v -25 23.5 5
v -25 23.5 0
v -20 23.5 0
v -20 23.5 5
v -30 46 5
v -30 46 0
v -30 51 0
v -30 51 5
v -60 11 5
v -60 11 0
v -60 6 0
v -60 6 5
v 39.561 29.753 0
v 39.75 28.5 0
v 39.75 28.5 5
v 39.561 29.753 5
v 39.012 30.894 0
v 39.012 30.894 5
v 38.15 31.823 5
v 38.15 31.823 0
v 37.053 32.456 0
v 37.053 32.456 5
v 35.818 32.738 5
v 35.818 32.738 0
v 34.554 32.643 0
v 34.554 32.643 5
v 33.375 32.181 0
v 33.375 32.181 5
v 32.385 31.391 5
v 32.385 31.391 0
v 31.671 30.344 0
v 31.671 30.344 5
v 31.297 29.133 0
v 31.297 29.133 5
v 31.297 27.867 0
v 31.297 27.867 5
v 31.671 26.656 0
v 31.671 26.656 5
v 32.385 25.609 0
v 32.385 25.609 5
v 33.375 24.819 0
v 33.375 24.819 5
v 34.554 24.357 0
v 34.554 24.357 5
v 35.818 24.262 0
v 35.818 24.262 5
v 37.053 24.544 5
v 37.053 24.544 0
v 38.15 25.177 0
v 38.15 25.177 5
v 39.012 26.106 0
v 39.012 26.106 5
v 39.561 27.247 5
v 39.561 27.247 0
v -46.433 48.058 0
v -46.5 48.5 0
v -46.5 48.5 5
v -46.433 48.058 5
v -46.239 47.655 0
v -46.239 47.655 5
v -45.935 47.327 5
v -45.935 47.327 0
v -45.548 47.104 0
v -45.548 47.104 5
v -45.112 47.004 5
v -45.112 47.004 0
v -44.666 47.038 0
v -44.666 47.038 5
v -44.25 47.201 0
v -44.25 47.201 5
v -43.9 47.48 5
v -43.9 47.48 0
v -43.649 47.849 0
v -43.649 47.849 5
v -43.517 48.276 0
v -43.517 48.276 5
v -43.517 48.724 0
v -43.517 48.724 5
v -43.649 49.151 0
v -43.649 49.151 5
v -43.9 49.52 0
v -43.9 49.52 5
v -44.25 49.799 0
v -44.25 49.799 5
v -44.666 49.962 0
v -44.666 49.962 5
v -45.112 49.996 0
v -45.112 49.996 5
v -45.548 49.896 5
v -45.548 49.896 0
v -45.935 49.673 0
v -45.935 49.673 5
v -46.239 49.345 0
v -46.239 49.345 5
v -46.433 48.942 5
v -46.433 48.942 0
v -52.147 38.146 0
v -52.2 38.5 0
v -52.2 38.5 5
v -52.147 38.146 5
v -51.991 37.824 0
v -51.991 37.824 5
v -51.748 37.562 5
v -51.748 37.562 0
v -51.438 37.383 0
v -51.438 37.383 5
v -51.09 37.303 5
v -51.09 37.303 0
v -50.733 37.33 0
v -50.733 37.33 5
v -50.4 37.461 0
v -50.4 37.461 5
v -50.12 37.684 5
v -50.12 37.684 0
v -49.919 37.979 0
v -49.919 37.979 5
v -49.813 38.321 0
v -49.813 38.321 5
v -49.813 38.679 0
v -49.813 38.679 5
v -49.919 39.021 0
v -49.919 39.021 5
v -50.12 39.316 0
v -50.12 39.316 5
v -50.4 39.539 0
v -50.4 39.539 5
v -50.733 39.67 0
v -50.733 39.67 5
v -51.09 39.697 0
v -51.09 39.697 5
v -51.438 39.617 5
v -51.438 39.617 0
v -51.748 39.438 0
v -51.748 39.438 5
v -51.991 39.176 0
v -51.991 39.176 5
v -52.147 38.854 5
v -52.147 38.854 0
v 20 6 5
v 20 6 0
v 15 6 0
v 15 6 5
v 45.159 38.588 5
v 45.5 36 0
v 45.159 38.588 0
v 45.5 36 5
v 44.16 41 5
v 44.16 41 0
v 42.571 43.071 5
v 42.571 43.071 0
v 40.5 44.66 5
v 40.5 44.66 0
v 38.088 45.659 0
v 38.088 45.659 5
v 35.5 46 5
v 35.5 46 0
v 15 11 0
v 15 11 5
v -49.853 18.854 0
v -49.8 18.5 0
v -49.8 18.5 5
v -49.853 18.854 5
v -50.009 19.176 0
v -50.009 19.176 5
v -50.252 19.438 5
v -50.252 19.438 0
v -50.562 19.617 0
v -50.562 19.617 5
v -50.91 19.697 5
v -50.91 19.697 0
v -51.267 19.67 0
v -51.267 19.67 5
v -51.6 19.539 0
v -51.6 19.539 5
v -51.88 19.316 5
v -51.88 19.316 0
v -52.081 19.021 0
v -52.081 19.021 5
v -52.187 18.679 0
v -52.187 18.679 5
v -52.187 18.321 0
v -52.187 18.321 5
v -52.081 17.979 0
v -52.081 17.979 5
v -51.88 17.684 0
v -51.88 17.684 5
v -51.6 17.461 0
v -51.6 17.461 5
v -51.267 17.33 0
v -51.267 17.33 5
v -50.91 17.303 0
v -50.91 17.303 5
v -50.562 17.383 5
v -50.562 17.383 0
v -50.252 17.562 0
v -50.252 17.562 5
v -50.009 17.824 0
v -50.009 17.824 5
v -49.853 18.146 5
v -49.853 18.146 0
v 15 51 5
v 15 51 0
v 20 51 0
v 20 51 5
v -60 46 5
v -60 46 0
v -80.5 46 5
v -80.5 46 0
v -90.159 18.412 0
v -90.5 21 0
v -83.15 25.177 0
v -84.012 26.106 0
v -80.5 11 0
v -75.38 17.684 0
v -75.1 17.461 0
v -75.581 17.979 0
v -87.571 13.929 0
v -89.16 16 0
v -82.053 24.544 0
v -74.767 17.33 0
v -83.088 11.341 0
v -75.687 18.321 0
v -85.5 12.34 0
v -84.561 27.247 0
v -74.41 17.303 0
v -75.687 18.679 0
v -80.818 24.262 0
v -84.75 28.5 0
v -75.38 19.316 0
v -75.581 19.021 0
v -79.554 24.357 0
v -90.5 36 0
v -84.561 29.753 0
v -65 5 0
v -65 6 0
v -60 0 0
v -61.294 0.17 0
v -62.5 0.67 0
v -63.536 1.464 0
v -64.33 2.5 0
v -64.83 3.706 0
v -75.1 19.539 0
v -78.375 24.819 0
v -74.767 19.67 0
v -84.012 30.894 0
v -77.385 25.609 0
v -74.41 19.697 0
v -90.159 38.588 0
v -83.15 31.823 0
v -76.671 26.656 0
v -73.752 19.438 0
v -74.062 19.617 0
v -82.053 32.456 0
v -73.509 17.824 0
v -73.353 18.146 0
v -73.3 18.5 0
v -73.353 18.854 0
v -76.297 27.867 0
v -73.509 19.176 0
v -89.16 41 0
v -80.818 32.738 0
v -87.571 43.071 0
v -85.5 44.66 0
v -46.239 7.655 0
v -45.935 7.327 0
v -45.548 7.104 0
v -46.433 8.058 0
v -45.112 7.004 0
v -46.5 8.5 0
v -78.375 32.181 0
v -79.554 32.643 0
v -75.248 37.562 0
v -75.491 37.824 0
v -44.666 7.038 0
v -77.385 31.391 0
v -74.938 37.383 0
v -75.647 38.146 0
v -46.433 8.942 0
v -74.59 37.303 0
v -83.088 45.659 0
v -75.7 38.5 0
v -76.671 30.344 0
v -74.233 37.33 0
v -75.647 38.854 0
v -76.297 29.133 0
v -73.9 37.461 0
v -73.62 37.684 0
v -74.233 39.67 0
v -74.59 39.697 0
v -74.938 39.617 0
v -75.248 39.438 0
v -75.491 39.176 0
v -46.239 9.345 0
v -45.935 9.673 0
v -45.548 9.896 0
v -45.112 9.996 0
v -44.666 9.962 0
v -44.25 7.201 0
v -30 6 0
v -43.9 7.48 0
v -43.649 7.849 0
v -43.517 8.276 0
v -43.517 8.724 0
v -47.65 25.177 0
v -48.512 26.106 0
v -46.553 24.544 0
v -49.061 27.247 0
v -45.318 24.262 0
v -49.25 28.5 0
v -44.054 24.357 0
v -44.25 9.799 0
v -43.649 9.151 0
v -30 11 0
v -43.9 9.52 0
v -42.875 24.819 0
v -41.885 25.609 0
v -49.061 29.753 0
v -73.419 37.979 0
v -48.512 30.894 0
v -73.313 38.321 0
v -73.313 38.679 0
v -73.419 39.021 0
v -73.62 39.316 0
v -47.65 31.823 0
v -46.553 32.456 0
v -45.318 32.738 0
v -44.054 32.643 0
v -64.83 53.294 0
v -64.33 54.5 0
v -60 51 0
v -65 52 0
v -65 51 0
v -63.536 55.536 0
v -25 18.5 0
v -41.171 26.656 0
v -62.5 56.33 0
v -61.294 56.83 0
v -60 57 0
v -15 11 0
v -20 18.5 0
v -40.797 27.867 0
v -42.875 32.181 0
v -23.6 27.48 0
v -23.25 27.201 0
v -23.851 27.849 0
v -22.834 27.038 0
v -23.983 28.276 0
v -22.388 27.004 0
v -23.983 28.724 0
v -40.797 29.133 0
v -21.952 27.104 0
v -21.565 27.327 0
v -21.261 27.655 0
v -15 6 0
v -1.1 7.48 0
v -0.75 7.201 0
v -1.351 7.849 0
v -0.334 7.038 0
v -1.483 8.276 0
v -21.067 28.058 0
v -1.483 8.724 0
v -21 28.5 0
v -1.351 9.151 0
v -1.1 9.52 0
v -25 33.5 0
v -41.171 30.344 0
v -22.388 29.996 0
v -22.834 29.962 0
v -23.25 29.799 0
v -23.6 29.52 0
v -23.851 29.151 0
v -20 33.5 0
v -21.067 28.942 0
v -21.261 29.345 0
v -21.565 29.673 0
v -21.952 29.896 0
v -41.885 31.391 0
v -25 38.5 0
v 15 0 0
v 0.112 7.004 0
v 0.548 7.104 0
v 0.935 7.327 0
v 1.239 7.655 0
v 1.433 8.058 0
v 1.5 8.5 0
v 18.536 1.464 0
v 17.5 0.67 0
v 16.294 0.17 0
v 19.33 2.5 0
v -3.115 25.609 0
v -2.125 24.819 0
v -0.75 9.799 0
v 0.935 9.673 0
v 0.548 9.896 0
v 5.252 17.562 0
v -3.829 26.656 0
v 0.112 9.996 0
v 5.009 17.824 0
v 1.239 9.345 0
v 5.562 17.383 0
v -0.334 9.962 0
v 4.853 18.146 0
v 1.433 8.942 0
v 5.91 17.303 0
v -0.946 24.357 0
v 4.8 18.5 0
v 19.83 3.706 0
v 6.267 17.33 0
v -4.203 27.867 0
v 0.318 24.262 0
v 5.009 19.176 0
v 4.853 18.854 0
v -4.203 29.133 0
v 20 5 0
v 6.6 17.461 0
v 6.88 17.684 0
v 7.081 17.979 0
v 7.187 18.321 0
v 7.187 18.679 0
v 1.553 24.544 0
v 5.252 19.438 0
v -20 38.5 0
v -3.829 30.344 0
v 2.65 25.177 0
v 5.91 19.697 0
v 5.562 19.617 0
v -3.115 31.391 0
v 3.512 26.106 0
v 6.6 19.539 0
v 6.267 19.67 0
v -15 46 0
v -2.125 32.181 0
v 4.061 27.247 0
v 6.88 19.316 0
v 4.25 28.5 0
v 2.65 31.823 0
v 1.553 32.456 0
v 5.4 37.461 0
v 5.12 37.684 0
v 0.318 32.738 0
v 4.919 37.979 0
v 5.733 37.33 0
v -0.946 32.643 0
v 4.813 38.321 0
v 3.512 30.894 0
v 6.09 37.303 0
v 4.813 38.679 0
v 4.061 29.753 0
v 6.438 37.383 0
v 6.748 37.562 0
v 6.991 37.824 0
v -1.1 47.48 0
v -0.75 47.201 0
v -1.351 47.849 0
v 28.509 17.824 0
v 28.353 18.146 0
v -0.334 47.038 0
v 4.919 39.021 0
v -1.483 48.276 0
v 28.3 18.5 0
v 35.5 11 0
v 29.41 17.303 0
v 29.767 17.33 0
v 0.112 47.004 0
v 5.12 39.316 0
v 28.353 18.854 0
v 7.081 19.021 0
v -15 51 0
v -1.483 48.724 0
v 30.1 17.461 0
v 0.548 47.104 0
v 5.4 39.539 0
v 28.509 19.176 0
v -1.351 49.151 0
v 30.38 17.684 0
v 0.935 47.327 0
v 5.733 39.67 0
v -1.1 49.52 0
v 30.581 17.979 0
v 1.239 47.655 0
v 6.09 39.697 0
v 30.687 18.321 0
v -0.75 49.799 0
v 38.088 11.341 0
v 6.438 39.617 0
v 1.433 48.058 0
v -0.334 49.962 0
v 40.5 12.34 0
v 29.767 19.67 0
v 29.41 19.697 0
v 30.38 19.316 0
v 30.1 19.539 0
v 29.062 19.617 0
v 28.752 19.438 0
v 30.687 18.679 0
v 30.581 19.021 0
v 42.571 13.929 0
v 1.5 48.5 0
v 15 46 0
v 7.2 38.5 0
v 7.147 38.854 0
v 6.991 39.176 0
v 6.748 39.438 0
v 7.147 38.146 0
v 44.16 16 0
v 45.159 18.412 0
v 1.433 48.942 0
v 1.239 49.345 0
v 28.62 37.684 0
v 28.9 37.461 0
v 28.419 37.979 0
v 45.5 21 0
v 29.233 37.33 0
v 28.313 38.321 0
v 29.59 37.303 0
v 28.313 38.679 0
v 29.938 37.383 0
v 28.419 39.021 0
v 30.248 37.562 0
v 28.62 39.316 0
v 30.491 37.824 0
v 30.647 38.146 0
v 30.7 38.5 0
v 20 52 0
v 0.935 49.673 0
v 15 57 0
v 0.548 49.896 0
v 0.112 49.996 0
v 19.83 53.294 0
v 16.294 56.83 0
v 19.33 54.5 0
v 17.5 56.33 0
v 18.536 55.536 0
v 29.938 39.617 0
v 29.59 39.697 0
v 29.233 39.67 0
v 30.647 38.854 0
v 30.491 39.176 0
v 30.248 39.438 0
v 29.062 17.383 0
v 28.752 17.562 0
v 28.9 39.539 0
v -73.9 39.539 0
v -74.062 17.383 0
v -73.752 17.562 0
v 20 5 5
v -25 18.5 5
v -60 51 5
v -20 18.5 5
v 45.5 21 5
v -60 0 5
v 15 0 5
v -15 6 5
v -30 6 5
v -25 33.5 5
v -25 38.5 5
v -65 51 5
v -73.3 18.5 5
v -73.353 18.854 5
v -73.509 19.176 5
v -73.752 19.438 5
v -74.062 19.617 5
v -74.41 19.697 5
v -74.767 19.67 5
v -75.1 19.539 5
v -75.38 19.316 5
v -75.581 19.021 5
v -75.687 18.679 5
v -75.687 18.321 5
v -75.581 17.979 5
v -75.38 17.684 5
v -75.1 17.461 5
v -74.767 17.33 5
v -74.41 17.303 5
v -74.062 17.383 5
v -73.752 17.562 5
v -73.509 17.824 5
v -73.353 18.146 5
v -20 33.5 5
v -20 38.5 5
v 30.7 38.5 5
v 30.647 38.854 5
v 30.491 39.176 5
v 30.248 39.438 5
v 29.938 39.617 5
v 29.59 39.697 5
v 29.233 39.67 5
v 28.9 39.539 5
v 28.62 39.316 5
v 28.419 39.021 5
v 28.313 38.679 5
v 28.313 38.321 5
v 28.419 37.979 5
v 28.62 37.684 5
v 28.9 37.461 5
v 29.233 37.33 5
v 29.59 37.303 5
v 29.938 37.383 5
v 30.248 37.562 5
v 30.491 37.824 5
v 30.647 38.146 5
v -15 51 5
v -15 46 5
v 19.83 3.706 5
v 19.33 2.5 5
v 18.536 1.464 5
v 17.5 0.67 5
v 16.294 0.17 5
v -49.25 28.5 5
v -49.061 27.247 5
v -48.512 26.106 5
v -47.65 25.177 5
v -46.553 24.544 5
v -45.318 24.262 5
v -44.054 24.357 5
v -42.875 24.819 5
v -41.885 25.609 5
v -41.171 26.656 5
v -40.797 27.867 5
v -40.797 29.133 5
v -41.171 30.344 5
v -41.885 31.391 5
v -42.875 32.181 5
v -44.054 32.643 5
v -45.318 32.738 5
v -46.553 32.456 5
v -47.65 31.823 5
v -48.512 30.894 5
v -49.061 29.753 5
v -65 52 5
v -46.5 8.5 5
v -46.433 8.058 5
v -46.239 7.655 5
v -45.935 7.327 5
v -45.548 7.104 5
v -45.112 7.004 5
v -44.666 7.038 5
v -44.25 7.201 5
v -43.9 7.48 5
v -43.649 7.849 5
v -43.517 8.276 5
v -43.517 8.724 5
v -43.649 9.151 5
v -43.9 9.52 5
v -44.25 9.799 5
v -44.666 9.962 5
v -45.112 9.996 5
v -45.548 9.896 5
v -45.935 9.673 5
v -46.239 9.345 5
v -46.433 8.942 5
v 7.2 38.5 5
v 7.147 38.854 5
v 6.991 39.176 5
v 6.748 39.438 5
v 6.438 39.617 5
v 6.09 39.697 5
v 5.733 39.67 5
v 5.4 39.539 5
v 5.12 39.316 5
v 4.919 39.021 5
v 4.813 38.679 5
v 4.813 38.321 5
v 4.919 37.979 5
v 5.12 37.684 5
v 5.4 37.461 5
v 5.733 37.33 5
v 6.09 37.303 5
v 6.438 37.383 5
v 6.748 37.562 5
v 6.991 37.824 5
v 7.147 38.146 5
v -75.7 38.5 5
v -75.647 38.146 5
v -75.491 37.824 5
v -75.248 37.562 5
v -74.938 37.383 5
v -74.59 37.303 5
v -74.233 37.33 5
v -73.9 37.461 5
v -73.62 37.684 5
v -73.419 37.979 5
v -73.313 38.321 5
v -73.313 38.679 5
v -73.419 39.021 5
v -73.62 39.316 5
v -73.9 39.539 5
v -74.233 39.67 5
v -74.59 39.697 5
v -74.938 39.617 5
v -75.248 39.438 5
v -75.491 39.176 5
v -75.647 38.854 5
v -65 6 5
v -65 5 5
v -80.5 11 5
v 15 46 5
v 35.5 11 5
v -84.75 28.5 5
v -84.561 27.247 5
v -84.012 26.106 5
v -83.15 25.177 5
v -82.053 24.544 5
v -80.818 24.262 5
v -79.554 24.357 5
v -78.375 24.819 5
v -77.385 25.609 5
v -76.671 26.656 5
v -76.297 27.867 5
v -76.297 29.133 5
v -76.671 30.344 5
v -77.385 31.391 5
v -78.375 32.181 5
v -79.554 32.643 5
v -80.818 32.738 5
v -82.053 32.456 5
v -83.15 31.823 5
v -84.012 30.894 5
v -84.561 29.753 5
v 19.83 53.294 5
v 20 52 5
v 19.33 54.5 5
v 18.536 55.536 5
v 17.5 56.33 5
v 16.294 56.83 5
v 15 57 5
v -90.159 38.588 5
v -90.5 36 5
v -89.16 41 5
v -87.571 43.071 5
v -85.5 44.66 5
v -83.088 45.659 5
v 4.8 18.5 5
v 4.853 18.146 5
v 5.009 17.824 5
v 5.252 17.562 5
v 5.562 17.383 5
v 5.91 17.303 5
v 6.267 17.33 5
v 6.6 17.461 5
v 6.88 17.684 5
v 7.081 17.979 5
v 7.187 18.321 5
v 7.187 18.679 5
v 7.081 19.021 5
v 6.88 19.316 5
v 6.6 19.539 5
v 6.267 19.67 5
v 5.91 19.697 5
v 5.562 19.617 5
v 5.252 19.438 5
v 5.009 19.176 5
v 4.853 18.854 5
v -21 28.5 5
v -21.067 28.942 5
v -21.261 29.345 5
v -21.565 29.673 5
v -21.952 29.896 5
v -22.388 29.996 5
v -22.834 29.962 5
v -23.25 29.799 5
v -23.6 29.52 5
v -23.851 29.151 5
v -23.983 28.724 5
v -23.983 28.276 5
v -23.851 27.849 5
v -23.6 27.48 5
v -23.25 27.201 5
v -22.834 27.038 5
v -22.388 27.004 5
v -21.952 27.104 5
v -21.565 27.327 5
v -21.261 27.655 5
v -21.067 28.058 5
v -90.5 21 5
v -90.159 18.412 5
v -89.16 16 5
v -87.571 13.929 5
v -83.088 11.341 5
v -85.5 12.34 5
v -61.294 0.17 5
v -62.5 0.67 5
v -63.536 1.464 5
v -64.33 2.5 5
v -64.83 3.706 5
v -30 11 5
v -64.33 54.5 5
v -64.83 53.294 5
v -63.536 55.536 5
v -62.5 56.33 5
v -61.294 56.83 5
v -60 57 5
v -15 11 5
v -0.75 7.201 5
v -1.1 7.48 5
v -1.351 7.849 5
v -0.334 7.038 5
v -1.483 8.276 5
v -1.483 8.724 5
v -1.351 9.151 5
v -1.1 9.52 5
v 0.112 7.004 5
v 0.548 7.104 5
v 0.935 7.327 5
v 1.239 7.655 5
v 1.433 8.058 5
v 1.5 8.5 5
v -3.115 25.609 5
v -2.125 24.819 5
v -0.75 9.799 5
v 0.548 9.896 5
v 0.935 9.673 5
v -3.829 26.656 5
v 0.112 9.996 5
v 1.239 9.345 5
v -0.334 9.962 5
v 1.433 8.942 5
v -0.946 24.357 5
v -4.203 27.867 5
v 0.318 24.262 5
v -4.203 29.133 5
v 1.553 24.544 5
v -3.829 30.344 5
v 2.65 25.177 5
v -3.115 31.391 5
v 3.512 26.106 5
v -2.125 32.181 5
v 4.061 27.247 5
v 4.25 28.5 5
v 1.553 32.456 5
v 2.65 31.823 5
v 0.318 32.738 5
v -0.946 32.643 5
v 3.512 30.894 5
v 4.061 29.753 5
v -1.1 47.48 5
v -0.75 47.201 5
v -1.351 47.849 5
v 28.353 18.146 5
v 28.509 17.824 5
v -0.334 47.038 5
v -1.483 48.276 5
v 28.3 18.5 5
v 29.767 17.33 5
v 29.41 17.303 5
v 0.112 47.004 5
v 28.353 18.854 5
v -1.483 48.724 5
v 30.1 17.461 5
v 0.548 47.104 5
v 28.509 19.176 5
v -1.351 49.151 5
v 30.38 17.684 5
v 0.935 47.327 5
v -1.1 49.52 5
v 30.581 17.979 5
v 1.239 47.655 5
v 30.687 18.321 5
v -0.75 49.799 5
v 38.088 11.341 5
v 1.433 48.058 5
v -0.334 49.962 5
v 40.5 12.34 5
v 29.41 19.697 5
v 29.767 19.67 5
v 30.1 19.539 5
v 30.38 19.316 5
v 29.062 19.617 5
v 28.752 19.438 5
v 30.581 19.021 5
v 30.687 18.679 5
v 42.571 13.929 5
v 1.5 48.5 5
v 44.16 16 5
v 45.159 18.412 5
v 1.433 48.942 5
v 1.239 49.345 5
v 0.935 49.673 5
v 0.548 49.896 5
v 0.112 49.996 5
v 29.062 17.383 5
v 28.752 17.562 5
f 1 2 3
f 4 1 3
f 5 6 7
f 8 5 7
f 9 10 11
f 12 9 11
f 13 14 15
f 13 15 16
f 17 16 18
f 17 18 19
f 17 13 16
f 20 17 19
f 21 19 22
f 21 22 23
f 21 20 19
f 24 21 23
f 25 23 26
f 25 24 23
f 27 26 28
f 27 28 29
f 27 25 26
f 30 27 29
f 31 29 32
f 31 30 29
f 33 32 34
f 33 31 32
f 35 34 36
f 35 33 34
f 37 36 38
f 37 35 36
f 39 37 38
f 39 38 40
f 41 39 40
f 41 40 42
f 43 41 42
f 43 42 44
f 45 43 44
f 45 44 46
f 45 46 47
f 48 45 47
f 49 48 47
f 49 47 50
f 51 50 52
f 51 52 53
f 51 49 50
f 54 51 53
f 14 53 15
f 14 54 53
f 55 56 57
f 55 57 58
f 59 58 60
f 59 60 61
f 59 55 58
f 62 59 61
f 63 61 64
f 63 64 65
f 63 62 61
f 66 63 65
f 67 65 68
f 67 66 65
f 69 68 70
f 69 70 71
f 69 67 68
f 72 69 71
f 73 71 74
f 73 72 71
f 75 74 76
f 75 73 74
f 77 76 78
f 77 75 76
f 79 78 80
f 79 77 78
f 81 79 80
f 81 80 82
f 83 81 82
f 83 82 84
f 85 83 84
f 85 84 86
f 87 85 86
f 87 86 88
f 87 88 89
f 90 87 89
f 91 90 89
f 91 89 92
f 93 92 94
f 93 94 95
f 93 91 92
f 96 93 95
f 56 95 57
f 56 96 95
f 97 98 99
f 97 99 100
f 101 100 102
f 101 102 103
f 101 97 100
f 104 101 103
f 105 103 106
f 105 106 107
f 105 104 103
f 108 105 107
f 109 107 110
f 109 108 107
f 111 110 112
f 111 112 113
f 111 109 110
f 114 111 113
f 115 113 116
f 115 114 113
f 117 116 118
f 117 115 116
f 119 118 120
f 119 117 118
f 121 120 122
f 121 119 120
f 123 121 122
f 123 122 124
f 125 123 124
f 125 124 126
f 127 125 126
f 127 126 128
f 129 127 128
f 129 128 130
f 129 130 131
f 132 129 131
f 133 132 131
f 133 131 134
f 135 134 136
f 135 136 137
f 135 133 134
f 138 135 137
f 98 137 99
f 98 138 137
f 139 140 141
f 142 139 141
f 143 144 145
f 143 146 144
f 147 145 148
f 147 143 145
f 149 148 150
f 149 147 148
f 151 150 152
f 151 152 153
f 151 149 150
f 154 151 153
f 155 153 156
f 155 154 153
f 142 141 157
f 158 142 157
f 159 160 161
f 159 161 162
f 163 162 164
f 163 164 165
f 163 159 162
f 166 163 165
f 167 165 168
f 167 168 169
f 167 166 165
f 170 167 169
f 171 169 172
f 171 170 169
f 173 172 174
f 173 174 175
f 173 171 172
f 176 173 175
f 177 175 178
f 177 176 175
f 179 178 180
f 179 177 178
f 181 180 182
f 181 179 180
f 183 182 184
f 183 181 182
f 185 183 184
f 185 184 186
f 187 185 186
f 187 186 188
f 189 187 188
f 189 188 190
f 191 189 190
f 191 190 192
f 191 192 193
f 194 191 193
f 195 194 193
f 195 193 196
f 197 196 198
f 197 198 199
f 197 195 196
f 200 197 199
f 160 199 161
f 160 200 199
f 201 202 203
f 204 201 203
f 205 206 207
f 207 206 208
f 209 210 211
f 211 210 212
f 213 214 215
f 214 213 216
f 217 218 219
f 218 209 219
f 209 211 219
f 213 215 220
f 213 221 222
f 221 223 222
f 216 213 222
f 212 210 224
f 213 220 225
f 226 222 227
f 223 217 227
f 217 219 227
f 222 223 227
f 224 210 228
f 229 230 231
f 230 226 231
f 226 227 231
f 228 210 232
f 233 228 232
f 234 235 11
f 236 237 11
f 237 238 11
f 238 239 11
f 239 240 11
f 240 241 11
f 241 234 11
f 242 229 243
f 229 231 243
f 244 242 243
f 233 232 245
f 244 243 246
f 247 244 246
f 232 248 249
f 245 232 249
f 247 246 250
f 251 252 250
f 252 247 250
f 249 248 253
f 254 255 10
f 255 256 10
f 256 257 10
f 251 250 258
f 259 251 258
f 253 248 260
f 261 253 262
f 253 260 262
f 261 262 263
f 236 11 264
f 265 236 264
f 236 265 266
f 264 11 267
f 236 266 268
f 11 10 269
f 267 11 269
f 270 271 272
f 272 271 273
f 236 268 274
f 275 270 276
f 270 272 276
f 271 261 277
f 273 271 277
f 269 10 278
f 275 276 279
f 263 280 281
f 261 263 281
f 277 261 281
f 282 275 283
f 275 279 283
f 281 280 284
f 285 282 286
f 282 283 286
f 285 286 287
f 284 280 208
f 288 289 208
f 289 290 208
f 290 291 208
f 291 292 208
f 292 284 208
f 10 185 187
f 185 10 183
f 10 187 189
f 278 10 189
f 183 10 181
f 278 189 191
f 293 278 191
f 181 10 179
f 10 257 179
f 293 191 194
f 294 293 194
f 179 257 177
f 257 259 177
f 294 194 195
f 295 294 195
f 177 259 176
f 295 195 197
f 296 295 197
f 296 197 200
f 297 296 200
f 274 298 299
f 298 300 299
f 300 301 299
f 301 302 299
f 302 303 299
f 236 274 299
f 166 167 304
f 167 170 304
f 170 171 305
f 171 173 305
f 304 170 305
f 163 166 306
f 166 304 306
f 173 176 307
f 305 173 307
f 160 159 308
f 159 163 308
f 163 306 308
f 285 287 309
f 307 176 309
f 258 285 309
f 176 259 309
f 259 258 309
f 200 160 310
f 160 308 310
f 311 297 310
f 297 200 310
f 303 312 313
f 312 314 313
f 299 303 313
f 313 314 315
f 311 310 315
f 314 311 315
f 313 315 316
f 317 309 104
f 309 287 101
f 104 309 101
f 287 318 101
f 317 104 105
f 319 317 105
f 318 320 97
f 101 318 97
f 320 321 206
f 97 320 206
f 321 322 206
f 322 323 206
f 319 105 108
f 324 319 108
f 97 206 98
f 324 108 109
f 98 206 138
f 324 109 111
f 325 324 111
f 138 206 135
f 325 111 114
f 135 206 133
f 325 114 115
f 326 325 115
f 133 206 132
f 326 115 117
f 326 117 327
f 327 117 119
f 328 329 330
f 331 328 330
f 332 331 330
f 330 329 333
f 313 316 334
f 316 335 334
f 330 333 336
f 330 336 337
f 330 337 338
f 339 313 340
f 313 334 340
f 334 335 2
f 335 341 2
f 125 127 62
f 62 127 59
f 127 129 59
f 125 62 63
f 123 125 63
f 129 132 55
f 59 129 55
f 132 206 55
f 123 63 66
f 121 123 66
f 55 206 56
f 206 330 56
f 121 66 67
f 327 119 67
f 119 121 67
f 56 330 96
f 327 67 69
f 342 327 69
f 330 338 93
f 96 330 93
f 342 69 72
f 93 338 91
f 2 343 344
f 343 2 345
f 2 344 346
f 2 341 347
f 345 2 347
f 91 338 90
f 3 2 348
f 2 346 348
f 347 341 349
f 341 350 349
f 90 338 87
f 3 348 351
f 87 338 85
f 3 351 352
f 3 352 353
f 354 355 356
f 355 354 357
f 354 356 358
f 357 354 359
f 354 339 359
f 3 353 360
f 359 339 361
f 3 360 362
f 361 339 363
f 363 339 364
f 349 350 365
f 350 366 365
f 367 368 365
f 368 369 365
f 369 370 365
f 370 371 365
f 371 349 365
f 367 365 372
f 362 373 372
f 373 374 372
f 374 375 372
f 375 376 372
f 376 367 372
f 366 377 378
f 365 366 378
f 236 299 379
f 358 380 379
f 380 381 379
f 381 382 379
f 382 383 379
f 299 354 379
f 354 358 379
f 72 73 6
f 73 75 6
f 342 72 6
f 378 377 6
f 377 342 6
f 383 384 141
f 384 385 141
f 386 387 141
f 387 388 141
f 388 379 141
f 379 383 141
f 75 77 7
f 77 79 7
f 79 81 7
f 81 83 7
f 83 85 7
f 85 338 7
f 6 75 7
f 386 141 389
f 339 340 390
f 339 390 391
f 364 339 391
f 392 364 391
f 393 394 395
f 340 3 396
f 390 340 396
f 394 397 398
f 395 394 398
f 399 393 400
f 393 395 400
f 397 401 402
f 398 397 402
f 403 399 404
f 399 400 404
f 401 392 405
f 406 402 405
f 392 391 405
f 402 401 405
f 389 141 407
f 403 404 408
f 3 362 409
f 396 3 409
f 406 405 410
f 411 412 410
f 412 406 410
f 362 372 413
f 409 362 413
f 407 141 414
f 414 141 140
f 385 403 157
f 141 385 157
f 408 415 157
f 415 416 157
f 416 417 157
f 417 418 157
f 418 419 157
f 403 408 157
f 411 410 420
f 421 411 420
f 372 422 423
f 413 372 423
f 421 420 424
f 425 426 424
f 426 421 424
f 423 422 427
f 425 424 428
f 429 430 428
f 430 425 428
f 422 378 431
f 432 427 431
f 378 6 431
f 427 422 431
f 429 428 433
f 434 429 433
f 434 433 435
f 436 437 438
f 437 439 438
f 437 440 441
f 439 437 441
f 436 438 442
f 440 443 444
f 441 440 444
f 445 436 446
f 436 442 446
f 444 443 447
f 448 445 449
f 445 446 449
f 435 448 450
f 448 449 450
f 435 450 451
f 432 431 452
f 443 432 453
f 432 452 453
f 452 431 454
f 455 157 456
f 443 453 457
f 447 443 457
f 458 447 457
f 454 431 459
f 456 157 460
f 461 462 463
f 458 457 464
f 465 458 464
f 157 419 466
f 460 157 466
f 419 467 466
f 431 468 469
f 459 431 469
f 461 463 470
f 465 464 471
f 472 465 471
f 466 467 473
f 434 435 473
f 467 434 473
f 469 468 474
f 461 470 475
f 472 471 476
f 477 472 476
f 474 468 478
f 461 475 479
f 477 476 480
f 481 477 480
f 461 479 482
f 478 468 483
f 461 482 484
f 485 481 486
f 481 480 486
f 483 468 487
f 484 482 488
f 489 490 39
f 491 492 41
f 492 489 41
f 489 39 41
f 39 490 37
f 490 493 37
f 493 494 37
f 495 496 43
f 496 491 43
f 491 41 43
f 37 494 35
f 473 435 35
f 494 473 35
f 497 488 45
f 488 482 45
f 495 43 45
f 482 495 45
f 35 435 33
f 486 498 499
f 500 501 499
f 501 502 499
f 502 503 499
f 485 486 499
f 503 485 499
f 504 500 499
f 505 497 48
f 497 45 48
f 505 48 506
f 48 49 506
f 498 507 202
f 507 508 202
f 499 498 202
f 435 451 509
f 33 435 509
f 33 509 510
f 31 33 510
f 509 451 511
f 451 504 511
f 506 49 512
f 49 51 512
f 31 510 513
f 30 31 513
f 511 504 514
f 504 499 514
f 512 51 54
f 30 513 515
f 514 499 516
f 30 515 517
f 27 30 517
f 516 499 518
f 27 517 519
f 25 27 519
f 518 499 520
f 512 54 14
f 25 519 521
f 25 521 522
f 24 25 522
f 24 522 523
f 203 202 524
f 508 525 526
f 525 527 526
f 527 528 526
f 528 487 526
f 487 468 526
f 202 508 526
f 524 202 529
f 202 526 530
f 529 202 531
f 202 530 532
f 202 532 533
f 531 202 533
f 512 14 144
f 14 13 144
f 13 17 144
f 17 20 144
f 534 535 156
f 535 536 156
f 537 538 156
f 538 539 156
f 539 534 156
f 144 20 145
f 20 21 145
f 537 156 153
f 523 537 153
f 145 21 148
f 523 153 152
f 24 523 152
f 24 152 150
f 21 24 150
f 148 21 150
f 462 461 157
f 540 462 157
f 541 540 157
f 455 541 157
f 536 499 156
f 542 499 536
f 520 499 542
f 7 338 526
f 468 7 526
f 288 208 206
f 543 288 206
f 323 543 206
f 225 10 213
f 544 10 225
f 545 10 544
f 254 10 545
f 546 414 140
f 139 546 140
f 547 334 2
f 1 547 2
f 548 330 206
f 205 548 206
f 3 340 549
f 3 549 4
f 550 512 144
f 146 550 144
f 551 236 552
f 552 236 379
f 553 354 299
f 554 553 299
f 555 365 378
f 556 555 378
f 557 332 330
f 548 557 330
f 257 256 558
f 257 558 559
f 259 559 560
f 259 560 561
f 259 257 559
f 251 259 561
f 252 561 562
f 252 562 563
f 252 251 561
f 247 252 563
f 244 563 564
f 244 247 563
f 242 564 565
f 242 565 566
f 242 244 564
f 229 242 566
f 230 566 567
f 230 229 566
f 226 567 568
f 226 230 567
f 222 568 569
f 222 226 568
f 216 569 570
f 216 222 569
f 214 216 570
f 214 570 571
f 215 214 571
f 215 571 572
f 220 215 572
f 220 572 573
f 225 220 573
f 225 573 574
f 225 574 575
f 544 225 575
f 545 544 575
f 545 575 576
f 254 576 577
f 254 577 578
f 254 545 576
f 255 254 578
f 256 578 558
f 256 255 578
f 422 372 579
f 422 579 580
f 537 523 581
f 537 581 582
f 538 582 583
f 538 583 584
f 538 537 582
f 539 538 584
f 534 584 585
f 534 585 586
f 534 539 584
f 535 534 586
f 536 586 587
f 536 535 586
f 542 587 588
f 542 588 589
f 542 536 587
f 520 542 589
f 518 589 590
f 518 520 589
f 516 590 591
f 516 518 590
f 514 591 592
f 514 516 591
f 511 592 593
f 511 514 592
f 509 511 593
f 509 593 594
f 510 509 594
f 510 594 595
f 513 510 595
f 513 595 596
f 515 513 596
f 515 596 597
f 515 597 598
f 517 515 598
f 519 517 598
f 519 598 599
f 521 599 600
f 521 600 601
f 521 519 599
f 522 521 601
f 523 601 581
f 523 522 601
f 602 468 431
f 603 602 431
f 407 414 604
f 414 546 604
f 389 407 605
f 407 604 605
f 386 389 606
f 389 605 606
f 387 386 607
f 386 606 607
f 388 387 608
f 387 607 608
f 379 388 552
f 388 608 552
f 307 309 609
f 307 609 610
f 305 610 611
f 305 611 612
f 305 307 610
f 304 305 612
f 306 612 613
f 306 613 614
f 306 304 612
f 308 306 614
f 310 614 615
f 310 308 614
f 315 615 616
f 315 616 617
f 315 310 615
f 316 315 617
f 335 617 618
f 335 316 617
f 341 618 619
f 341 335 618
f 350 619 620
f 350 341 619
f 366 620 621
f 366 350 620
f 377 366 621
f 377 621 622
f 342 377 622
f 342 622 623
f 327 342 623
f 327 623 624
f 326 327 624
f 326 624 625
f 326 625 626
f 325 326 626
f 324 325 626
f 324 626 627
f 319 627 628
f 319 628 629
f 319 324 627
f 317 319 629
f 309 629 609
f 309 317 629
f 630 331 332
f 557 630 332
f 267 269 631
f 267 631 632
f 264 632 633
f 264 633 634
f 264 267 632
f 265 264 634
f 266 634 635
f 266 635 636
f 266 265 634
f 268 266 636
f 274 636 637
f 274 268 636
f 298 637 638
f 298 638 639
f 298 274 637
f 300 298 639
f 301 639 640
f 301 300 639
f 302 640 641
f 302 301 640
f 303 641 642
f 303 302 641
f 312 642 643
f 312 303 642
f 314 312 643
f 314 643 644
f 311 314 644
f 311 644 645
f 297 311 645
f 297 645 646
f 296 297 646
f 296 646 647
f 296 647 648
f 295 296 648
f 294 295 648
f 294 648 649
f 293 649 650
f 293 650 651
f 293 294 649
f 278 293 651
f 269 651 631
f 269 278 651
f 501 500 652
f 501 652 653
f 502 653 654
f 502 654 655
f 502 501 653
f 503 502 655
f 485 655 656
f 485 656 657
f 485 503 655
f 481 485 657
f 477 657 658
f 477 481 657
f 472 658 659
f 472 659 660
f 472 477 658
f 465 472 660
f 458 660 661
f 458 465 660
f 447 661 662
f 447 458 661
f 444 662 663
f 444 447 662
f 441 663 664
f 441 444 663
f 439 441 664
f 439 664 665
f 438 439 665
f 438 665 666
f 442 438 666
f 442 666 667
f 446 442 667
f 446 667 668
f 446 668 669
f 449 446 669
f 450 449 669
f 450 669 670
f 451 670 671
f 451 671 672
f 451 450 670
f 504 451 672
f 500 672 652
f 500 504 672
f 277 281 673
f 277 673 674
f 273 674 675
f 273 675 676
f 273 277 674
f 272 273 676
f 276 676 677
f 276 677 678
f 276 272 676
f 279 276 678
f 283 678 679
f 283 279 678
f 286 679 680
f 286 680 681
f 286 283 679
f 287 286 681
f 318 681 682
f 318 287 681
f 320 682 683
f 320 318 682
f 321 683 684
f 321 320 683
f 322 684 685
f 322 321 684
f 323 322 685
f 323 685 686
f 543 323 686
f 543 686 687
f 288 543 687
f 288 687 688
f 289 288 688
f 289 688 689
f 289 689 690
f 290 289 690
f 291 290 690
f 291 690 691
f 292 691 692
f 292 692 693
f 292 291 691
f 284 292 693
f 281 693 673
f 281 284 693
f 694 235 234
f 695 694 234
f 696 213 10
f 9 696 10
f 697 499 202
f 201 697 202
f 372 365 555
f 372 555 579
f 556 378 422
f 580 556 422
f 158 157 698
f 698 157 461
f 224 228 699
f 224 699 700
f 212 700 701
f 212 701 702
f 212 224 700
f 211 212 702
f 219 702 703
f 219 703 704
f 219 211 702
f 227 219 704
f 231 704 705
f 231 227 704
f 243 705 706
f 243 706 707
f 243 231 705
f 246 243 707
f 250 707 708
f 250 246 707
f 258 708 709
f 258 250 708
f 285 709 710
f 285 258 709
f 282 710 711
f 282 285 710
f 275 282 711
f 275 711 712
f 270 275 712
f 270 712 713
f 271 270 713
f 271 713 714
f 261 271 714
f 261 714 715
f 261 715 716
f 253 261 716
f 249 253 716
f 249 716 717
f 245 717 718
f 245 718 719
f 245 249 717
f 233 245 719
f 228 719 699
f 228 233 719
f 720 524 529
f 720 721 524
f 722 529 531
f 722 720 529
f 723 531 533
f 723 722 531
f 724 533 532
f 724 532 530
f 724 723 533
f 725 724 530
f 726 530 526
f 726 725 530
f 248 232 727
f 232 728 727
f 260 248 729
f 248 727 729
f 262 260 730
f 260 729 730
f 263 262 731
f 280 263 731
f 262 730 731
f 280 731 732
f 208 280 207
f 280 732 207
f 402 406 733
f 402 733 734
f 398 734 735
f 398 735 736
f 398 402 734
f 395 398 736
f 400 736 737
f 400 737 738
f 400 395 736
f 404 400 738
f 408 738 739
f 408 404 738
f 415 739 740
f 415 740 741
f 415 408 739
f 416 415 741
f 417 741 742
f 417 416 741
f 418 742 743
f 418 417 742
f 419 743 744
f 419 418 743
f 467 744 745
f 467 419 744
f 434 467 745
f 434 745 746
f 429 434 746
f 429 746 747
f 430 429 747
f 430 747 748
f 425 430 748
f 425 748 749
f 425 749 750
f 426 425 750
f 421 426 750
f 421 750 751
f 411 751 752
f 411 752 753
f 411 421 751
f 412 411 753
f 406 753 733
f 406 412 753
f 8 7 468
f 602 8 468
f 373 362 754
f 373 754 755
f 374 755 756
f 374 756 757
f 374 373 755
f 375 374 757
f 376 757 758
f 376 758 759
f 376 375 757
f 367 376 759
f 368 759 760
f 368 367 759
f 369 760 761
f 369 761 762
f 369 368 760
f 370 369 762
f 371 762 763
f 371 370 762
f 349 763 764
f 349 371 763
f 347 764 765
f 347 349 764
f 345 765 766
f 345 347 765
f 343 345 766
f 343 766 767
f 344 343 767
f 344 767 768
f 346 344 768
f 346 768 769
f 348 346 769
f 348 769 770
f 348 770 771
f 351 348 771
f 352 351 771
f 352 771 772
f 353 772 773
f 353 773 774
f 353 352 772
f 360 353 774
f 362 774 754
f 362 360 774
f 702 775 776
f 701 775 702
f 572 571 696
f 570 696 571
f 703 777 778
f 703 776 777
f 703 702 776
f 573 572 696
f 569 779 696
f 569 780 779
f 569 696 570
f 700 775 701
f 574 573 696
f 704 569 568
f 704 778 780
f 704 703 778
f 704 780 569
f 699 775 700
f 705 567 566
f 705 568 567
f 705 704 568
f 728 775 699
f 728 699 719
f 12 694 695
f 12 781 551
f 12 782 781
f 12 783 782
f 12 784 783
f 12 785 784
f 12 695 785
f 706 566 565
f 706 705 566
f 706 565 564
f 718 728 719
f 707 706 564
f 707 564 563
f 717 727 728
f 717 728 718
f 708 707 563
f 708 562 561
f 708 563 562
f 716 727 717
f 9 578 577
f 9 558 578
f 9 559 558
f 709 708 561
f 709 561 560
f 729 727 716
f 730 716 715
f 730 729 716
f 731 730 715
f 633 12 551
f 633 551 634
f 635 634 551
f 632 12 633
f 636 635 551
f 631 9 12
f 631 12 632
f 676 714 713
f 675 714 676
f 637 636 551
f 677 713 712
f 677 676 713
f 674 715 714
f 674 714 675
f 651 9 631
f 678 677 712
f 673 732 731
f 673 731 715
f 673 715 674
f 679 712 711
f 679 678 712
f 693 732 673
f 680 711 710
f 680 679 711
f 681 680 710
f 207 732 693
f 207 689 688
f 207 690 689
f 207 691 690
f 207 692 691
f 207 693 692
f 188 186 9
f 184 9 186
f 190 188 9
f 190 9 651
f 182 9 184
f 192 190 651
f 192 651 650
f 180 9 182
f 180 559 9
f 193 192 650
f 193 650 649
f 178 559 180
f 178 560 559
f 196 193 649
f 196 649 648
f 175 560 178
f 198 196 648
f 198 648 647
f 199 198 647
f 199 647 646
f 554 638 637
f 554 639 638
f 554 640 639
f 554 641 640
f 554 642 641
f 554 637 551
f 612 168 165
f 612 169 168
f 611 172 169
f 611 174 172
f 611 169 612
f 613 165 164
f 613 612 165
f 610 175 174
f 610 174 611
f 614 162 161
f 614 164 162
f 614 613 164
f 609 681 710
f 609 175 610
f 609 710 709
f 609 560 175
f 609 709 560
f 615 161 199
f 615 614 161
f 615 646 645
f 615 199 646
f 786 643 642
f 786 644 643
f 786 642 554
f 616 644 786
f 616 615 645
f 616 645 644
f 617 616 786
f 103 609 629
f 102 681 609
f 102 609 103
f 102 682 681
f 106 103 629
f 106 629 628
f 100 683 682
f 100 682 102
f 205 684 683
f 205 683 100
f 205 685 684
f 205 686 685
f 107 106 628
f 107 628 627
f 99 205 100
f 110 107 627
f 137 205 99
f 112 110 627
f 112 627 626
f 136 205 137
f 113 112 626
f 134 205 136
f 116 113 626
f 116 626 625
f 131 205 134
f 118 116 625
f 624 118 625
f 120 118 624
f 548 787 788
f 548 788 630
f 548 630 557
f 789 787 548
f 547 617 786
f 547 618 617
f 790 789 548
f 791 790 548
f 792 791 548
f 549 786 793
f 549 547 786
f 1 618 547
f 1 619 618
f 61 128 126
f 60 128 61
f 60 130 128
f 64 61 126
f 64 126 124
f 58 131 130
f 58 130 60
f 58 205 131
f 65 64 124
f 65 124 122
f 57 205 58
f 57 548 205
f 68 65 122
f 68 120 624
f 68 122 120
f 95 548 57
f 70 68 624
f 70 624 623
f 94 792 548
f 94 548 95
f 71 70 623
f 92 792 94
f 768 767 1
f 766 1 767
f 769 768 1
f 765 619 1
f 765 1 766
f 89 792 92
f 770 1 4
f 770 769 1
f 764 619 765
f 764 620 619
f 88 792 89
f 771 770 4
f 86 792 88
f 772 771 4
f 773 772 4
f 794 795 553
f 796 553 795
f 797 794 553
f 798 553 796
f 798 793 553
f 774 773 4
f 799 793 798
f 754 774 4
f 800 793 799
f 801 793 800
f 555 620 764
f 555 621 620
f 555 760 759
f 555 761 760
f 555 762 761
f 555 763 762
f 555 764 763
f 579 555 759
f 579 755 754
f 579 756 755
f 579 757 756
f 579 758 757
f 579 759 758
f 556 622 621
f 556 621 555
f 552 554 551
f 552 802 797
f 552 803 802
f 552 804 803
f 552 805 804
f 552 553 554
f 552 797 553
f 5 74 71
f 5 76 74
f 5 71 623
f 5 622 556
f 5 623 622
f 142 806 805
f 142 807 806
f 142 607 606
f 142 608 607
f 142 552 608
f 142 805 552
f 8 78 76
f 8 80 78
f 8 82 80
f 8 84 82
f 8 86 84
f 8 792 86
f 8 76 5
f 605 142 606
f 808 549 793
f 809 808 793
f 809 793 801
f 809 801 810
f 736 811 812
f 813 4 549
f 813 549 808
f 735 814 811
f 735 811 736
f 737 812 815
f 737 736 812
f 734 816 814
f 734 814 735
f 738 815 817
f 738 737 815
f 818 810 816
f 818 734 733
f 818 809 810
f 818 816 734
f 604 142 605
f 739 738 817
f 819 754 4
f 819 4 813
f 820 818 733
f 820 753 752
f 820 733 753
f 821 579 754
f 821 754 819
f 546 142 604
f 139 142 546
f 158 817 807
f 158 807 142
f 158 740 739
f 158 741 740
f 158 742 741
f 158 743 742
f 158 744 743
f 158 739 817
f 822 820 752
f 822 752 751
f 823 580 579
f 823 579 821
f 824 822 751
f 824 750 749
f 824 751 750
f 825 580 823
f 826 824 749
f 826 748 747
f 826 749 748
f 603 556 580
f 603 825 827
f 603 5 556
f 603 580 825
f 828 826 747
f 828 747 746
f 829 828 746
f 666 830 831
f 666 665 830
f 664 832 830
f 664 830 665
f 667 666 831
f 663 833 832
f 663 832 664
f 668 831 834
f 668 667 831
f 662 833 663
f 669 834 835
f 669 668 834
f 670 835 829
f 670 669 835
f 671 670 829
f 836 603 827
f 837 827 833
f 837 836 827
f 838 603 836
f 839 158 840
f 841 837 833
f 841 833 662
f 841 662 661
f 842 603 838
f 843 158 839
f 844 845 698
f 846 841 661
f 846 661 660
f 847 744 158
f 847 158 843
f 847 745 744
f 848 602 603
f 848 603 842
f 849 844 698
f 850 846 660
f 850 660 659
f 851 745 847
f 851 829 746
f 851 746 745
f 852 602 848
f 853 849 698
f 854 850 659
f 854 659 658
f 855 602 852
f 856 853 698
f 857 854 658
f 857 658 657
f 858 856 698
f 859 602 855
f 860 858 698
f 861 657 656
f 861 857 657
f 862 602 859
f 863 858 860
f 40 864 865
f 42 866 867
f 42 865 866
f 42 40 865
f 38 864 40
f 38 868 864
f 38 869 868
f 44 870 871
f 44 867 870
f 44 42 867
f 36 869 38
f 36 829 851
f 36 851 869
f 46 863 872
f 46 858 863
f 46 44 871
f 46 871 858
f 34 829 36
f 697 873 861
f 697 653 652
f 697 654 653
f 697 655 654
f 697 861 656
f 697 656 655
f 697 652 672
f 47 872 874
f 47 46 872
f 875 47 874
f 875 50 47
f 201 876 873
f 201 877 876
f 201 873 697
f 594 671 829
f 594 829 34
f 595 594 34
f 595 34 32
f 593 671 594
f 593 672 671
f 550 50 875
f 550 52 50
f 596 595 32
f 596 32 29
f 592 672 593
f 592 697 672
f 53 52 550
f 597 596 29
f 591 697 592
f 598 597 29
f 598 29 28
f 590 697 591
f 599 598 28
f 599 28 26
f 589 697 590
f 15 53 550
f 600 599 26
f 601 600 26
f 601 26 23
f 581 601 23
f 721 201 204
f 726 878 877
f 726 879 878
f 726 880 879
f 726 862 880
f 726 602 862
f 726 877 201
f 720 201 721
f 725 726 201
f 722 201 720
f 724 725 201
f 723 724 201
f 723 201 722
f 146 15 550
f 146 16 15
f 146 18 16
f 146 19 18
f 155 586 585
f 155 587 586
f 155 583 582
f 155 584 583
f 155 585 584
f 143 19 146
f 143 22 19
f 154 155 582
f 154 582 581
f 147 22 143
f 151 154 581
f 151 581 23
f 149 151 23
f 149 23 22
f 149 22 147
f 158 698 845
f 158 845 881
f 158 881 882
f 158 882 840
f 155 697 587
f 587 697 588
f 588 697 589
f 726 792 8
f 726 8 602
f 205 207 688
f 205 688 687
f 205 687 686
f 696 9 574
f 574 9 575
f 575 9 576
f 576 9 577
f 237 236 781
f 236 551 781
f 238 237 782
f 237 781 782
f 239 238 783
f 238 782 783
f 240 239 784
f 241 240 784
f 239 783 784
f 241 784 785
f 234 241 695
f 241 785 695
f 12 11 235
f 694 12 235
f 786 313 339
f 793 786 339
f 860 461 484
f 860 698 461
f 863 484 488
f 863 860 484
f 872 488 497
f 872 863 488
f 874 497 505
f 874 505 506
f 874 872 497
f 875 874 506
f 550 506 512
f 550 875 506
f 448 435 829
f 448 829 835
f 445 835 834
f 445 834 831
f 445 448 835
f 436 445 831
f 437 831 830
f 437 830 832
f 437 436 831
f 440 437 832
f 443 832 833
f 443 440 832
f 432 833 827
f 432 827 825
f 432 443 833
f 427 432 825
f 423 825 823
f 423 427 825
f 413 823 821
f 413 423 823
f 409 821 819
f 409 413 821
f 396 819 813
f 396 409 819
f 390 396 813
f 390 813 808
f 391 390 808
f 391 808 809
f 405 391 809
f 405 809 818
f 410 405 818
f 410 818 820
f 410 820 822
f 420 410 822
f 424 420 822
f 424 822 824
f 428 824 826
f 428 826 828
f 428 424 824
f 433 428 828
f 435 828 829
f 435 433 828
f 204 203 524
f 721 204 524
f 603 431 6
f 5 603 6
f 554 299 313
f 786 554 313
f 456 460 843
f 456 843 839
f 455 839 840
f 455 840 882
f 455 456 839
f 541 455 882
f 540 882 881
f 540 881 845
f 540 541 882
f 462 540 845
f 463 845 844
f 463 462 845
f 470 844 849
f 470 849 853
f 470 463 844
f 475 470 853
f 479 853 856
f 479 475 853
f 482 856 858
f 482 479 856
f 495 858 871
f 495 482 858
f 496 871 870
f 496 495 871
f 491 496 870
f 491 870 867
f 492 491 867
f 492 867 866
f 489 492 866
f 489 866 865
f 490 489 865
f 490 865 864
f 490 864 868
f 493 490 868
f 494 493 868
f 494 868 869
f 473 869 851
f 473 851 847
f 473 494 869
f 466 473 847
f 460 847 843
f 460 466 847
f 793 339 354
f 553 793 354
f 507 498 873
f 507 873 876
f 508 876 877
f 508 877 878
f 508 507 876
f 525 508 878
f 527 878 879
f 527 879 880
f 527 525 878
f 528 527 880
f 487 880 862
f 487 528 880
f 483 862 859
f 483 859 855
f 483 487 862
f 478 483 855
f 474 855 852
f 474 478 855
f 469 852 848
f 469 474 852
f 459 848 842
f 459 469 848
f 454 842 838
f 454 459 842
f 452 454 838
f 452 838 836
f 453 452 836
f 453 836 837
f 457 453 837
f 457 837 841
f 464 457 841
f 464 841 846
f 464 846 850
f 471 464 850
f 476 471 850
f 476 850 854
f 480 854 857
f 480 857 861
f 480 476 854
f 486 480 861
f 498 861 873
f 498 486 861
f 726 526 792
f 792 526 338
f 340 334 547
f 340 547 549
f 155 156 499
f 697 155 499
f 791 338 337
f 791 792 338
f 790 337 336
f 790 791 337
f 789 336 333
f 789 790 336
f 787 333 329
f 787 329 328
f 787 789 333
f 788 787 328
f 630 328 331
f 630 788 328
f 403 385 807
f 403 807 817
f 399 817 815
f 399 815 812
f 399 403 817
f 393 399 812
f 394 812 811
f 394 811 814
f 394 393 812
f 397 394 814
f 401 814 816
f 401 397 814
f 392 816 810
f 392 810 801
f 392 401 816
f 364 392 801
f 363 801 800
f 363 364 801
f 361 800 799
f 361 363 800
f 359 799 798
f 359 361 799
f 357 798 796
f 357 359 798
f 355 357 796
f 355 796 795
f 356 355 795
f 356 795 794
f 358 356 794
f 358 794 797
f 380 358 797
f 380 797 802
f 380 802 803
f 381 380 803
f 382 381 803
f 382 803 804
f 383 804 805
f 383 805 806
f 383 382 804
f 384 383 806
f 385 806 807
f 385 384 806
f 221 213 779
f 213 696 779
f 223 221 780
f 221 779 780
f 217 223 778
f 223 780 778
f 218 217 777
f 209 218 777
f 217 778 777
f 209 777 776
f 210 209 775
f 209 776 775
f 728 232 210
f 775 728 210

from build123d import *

# Parameters (mm, degrees)
ESQUISSE1_R        = 1.5
ESQUISSE1_R_2      = 4.25
ESQUISSE1_R_3      = 1.2
ESQUISSE1_W        = 5
ESQUISSE1_H        = 5
BOSS_EXTRU_1_DEPTH = 5
CONG_1_R           = 5
CONG_2_R           = 10


with BuildPart() as part:
    # Esquisse1 → Boss.-Extru.1 (new body)
    with BuildSketch(Plane.XY):
        Polygon((-20, 0), (20, 0), (20, 6), (15, 6), (15, 11), (20, 11), (45.5, 11), (45.5, 46), (20, 46), (15, 46), (15, 51), (20, 51), (20, 57), (-20, 57), (-25, 57), (-65, 57), (-65, 51), (-60, 51), (-60, 46), (-65, 46), (-90.5, 46), (-90.5, 11), (-65, 11), (-60, 11), (-60, 6), (-65, 6), (-65, 0), (-25, 0), align=None)
        with Locations((0, 48.5)):
            Circle(ESQUISSE1_R, mode=Mode.SUBTRACT)
        with Locations((0, 8.5)):
            Circle(ESQUISSE1_R, mode=Mode.SUBTRACT)
        with Locations((0, 28.5)):
            Circle(ESQUISSE1_R_2, mode=Mode.SUBTRACT)
        with Locations(Location((-45, 8.5, 0), (0, 0, 180))):
            Circle(ESQUISSE1_R, mode=Mode.SUBTRACT)
        with Locations(Location((-45, 28.5, 0), (0, 0, 180))):
            Circle(ESQUISSE1_R_2, mode=Mode.SUBTRACT)
        with Locations(Location((-45, 48.5, 0), (0, 0, 180))):
            Circle(ESQUISSE1_R, mode=Mode.SUBTRACT)
        with Locations((6, 38.5)):
            Circle(ESQUISSE1_R_3, mode=Mode.SUBTRACT)
        with Locations(Location((6, 18.5, 0), (0, 0, 180))):
            Circle(ESQUISSE1_R_3, mode=Mode.SUBTRACT)
        with Locations((-51, 18.5)):
            Circle(ESQUISSE1_R_3, mode=Mode.SUBTRACT)
        with Locations(Location((-51, 38.5, 0), (0, 0, 180))):
            Circle(ESQUISSE1_R_3, mode=Mode.SUBTRACT)
        with Locations((35.5, 28.5)):
            Circle(ESQUISSE1_R_2, mode=Mode.SUBTRACT)
        with Locations(Location((-80.5, 28.5, 0), (0, 0, 180))):
            Circle(ESQUISSE1_R_2, mode=Mode.SUBTRACT)
        with Locations((29.5, 38.5)):
            Circle(ESQUISSE1_R_3, mode=Mode.SUBTRACT)
        with Locations(Location((29.5, 18.5, 0), (0, 0, 180))):
            Circle(ESQUISSE1_R_3, mode=Mode.SUBTRACT)
        with Locations((-74.5, 18.5)):
            Circle(ESQUISSE1_R_3, mode=Mode.SUBTRACT)
        with Locations(Location((-74.5, 38.5, 0), (0, 0, 180))):
            Circle(ESQUISSE1_R_3, mode=Mode.SUBTRACT)
        with Locations((-22.5, 28.5)):
            Circle(ESQUISSE1_R, mode=Mode.SUBTRACT)
        Polygon((-20, 51), (-15, 51), (-15, 46), (-20, 46), (-25, 46), (-30, 46), (-30, 51), (-25, 51), align=None, mode=Mode.SUBTRACT)
        Polygon((-20, 11), (-15, 11), (-15, 6), (-20, 6), (-25, 6), (-30, 6), (-30, 11), (-25, 11), align=None, mode=Mode.SUBTRACT)
        with Locations((-22.5, 21)):
            Rectangle(ESQUISSE1_W, ESQUISSE1_H, mode=Mode.SUBTRACT)
        with Locations((-22.5, 36)):
            Rectangle(ESQUISSE1_W, ESQUISSE1_H, mode=Mode.SUBTRACT)
    extrude(amount=BOSS_EXTRU_1_DEPTH)

    # Congé1
    cong_1_edges = [part.edges().sort_by_distance(p)[0] for p in [
        (-65, 0, 2.5),
        (-65, 57, 2.5),
        (20, 57, 2.5),
        (20, 0, 2.5),
    ]]
    fillet(cong_1_edges, radius=CONG_1_R)

    # Congé2
    cong_2_edges = [part.edges().sort_by_distance(p)[0] for p in [
        (-90.5, 11, 2.5),
        (-90.5, 46, 2.5),
        (45.5, 46, 2.5),
        (45.5, 11, 2.5),
    ]]
    fillet(cong_2_edges, radius=CONG_2_R)


solid = part.part
